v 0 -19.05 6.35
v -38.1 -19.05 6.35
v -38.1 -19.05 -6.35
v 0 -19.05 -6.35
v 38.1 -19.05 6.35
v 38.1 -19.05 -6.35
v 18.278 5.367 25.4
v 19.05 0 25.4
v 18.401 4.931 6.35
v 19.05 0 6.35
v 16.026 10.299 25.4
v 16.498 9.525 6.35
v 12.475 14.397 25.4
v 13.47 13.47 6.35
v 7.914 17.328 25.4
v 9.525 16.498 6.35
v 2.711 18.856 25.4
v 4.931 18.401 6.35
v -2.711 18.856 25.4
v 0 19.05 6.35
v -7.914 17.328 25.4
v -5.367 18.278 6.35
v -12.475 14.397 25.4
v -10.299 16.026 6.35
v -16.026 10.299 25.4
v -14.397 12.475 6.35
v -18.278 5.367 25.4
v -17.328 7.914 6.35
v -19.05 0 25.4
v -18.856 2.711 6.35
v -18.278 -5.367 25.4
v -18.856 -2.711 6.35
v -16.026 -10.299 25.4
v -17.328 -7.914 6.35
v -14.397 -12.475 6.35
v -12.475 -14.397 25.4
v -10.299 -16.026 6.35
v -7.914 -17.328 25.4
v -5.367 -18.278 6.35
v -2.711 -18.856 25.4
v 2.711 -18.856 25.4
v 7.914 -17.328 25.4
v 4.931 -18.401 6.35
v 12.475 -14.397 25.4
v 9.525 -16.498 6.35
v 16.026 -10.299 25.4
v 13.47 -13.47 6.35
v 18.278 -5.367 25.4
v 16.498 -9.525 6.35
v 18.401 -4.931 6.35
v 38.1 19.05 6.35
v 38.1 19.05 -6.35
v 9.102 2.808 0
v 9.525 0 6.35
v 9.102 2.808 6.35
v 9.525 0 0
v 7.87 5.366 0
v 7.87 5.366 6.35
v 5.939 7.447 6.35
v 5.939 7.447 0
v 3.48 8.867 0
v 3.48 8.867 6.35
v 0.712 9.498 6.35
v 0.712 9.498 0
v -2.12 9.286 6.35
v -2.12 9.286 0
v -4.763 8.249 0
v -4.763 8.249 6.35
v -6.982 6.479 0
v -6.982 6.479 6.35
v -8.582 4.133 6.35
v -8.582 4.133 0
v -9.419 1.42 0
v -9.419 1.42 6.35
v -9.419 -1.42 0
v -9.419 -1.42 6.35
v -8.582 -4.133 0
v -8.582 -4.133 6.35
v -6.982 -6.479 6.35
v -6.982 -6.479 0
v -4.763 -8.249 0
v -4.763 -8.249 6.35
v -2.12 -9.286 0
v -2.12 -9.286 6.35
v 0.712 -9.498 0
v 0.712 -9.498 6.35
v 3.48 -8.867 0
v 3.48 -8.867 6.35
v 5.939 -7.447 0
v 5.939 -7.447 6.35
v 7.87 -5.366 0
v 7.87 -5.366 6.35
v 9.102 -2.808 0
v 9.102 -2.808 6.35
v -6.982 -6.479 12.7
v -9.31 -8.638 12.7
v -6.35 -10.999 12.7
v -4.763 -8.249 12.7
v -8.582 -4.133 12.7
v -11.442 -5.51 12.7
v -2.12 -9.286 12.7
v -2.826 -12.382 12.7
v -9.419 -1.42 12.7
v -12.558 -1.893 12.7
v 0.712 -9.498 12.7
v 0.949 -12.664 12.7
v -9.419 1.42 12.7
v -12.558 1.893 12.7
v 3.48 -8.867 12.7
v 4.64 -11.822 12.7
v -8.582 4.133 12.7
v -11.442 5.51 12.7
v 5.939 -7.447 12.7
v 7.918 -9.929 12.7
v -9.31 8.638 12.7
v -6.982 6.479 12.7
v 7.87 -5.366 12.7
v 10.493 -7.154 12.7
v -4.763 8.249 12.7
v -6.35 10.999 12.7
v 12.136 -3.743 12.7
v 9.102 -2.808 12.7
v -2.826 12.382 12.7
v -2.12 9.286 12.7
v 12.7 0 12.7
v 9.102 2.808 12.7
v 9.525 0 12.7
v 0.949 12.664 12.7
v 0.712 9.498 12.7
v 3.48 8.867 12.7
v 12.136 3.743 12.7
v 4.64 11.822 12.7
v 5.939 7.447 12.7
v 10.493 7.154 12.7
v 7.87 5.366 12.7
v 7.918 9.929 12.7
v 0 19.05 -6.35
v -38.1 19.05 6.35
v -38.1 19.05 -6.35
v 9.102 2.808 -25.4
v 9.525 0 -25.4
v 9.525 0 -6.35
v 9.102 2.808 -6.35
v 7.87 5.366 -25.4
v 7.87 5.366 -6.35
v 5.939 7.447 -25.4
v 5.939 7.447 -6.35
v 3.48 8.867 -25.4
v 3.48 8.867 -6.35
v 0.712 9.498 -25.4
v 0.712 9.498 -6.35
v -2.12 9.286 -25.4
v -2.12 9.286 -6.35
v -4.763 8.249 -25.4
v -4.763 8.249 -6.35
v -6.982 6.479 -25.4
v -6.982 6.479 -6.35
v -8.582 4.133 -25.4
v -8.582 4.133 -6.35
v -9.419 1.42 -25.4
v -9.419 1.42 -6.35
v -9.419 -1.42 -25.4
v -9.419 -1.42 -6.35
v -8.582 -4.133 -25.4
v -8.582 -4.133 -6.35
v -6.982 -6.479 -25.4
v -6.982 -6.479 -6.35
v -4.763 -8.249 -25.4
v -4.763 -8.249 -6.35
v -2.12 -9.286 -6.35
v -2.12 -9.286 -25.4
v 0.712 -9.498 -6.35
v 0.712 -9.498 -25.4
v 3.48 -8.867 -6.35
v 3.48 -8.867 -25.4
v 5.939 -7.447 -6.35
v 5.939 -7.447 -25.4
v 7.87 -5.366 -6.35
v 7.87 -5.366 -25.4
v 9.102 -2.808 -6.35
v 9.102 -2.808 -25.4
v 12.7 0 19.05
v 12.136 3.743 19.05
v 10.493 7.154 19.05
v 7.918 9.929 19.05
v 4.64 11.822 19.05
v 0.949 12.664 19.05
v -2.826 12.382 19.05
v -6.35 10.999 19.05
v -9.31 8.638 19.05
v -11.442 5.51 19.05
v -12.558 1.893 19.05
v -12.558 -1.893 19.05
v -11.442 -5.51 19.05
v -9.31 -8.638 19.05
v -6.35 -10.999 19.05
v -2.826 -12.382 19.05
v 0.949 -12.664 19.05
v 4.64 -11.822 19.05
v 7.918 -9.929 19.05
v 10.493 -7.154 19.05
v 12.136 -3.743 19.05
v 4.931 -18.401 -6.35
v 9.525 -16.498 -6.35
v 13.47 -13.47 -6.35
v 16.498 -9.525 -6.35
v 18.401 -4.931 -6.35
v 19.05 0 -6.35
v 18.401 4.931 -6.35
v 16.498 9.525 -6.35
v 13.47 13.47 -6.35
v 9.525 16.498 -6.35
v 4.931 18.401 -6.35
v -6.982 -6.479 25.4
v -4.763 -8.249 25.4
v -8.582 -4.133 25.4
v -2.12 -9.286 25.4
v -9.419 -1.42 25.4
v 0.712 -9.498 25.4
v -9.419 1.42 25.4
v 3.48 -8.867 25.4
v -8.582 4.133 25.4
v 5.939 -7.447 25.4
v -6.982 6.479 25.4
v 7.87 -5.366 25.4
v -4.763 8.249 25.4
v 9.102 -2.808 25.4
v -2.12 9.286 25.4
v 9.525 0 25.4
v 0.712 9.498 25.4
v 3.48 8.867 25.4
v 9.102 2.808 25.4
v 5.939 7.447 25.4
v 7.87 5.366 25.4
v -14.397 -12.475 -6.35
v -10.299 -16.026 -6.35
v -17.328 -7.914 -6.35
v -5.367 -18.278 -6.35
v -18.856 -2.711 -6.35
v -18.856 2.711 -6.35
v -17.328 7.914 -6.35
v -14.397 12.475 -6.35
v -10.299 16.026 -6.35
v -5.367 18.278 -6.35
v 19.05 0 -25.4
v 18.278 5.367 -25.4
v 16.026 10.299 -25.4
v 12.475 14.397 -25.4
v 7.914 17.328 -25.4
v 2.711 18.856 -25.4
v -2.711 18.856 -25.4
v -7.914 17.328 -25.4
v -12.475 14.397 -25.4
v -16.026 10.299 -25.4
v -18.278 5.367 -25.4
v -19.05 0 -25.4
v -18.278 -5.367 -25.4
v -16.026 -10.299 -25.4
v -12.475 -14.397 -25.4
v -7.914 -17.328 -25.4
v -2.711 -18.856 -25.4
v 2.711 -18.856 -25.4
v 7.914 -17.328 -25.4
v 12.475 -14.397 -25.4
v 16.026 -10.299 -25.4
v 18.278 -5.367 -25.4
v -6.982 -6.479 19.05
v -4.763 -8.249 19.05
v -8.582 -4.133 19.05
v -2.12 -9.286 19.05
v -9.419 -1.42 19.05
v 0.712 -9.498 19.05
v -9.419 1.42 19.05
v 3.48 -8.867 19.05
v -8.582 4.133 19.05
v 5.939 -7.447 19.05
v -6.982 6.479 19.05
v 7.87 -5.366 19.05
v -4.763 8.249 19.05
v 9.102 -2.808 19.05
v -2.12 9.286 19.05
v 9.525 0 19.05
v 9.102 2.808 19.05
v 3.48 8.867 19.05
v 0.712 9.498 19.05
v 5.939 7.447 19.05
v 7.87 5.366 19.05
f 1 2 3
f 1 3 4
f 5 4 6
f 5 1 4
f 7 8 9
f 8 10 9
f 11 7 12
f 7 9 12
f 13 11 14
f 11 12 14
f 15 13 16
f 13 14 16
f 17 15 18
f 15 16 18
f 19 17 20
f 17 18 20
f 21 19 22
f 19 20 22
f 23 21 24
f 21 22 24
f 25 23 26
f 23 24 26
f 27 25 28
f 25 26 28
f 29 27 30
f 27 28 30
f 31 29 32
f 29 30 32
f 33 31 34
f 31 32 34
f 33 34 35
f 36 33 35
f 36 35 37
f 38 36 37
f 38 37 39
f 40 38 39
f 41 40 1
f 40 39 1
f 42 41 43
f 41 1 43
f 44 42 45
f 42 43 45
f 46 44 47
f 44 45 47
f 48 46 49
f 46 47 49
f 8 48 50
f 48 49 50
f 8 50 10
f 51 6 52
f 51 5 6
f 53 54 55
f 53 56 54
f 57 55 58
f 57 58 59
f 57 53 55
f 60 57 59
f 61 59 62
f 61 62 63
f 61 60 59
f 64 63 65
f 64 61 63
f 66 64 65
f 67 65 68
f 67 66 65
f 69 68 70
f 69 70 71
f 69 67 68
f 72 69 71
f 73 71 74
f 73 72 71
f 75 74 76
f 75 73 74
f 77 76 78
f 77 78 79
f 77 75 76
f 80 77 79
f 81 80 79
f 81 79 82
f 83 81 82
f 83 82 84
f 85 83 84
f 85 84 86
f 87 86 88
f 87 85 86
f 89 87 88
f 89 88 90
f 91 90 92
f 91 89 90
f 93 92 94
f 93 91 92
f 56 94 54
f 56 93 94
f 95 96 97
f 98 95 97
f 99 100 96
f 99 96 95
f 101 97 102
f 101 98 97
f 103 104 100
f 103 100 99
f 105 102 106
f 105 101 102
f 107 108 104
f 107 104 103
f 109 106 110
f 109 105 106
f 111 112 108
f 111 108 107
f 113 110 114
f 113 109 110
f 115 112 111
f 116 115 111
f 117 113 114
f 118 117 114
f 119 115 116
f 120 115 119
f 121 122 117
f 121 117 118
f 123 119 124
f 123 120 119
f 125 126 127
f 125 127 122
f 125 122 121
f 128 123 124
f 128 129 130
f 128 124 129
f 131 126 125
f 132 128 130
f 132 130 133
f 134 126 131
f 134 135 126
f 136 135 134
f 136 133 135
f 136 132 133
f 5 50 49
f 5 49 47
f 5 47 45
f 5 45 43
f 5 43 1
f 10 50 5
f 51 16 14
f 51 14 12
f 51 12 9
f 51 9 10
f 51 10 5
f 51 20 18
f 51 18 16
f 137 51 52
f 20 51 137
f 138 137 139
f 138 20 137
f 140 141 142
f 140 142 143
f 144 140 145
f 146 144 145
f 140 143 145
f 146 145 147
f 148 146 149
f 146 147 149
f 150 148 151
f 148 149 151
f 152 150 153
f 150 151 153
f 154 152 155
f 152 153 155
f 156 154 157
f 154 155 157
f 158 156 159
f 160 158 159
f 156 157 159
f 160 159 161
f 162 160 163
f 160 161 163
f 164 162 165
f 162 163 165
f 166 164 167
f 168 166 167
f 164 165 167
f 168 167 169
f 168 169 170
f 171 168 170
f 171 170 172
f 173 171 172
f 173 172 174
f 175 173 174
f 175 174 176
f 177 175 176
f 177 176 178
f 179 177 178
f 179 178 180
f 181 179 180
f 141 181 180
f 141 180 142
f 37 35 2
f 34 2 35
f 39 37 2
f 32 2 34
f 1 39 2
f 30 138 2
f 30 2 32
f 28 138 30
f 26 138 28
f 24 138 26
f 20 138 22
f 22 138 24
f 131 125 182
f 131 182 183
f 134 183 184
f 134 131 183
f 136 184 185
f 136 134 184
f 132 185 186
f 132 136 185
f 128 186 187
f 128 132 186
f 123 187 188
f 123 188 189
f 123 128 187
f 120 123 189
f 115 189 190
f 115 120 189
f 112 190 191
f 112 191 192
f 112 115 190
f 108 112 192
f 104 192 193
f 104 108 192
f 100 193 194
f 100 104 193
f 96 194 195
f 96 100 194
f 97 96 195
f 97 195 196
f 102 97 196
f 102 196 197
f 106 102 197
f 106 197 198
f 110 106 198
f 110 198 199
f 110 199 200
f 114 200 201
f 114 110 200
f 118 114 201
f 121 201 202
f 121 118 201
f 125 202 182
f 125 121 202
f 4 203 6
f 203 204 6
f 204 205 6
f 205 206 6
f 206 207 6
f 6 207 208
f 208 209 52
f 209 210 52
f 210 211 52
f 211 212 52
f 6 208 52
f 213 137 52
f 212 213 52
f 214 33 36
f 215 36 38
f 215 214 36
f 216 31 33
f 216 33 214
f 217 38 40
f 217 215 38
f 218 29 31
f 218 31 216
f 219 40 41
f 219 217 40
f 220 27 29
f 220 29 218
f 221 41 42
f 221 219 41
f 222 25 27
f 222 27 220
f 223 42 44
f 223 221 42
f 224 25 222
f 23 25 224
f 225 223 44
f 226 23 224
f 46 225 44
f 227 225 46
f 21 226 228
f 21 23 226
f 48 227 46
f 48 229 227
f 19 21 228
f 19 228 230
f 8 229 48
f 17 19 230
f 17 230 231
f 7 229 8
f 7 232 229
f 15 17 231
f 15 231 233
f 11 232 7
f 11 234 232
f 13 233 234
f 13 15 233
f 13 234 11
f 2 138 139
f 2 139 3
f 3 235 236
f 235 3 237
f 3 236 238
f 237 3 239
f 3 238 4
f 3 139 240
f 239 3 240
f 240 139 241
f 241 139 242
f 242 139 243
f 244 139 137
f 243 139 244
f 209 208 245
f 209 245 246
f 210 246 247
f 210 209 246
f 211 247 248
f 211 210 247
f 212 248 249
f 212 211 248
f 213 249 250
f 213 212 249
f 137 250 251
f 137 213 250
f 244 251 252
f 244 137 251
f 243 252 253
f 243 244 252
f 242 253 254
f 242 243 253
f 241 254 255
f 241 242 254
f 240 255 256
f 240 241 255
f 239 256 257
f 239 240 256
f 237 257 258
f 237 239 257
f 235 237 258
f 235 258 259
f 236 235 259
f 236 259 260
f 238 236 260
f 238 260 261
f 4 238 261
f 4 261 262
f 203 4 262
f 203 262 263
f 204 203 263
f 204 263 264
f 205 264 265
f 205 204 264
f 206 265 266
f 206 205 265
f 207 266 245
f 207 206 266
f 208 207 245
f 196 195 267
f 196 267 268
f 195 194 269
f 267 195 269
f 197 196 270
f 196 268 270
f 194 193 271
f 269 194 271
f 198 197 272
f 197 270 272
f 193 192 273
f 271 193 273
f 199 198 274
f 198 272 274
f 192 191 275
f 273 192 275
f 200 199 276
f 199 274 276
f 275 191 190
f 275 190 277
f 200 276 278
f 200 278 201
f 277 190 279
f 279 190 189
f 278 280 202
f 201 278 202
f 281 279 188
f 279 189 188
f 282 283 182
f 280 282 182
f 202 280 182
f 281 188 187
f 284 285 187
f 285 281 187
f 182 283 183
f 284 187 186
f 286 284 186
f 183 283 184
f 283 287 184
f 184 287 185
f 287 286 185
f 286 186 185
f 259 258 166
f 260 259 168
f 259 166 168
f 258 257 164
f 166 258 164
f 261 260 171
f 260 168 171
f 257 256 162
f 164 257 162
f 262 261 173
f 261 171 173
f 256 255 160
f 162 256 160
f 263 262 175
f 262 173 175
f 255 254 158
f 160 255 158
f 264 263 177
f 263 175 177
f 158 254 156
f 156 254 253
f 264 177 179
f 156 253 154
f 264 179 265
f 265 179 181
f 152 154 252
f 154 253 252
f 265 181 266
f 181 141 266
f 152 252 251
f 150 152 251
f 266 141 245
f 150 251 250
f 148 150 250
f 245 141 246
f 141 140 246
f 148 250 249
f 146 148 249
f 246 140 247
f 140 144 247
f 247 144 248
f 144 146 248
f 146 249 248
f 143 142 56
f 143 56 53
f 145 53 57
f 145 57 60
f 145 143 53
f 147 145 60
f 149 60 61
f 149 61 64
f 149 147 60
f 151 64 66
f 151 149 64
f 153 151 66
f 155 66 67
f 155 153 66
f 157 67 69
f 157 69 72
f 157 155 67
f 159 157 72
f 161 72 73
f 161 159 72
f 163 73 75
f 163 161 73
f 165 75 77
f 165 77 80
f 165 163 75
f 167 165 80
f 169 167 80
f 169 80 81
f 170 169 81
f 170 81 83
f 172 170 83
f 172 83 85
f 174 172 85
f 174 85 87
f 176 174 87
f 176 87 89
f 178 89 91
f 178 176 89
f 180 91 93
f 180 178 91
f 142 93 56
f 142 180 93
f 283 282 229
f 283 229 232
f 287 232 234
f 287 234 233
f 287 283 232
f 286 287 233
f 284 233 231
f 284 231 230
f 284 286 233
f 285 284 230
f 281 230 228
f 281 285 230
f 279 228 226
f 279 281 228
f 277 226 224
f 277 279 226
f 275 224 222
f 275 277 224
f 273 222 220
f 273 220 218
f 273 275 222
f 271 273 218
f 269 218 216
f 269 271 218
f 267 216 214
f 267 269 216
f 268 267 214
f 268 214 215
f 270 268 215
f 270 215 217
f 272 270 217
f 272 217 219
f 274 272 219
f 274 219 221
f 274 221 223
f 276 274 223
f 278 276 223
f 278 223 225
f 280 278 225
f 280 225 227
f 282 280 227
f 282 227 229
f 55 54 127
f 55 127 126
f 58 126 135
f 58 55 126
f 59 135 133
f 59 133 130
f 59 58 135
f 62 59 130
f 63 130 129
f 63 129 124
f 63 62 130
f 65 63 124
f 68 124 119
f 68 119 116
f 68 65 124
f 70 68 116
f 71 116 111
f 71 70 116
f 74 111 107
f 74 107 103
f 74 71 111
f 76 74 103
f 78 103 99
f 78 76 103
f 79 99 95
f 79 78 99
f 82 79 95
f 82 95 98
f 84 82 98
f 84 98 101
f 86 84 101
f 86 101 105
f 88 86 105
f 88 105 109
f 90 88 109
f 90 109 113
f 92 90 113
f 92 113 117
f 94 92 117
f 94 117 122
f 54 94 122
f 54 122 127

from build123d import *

# Parameters (mm, degrees)
F0_R          = 9.525
F1_DEPTH      = 6.35
F2_DEPTH      = 25.4
F2_DEPTH_BACK = 12.7
F3_R          = 19.05
F3_R_2        = 12.7
F3_R_3        = 9.525
F4_DEPTH      = 12.7
F5_DEPTH      = 6.35


with BuildPart() as f1:
    # F0 (on Top) → F1 (new body, symmetric)
    with BuildSketch(Plane.XY):
        with BuildLine():
            ThreePointArc((0, -19.05), (13.4703841816, -13.4703841816), (19.05, 0))
            ThreePointArc((19.05, 0), (13.4703841816, 13.4703841816), (0, 19.05))
            ThreePointArc((0, 19.05), (-19.05, 0), (0, -19.05))
        make_face()
        Circle(F0_R, mode=Mode.SUBTRACT)
        with BuildLine():
            ThreePointArc((0, 19.05), (13.4703841816, 13.4703841816), (19.05, 0))
            ThreePointArc((19.05, 0), (13.4703841816, -13.4703841816), (0, -19.05))
            Line((0, -19.05), (38.1, -19.05))
            Line((38.1, -19.05), (38.1, 19.05))
            Line((38.1, 19.05), (0, 19.05))
        make_face()
        with BuildLine():
            ThreePointArc((0, -19.05), (-19.05, 0), (0, 19.05))
            Line((0, 19.05), (-38.1, 19.05))
            Line((-38.1, 19.05), (-38.1, -19.05))
            Line((-38.1, -19.05), (0, -19.05))
        make_face()
    extrude(amount=F1_DEPTH, both=True)

    # F0 (on Top) → F2 (join, two sides)
    with BuildSketch(Plane.XY) as f2_sk:
        with BuildLine():
            ThreePointArc((0, -19.05), (13.4703841816, -13.4703841816), (19.05, 0))
            ThreePointArc((19.05, 0), (13.4703841816, 13.4703841816), (0, 19.05))
            ThreePointArc((0, 19.05), (-19.05, 0), (0, -19.05))
        make_face()
        Circle(F0_R, mode=Mode.SUBTRACT)
    extrude(amount=-F2_DEPTH)
    extrude(f2_sk.sketch, amount=F2_DEPTH_BACK)

    # F3 (on face) → F4 (join)
    with BuildSketch(Plane.XY.offset(12.7)):
        Circle(F3_R)
        Circle(F3_R_2, mode=Mode.SUBTRACT)
        Circle(F3_R_2)
        Circle(F3_R_3, mode=Mode.SUBTRACT)
    extrude(amount=F4_DEPTH)

    # F3 (on face) → F5 (cut)
    with BuildSketch(Plane.XY.offset(12.7)):
        Circle(F3_R_2)
        Circle(F3_R_3, mode=Mode.SUBTRACT)
    extrude(amount=F5_DEPTH, mode=Mode.SUBTRACT)


solid = f1.part
